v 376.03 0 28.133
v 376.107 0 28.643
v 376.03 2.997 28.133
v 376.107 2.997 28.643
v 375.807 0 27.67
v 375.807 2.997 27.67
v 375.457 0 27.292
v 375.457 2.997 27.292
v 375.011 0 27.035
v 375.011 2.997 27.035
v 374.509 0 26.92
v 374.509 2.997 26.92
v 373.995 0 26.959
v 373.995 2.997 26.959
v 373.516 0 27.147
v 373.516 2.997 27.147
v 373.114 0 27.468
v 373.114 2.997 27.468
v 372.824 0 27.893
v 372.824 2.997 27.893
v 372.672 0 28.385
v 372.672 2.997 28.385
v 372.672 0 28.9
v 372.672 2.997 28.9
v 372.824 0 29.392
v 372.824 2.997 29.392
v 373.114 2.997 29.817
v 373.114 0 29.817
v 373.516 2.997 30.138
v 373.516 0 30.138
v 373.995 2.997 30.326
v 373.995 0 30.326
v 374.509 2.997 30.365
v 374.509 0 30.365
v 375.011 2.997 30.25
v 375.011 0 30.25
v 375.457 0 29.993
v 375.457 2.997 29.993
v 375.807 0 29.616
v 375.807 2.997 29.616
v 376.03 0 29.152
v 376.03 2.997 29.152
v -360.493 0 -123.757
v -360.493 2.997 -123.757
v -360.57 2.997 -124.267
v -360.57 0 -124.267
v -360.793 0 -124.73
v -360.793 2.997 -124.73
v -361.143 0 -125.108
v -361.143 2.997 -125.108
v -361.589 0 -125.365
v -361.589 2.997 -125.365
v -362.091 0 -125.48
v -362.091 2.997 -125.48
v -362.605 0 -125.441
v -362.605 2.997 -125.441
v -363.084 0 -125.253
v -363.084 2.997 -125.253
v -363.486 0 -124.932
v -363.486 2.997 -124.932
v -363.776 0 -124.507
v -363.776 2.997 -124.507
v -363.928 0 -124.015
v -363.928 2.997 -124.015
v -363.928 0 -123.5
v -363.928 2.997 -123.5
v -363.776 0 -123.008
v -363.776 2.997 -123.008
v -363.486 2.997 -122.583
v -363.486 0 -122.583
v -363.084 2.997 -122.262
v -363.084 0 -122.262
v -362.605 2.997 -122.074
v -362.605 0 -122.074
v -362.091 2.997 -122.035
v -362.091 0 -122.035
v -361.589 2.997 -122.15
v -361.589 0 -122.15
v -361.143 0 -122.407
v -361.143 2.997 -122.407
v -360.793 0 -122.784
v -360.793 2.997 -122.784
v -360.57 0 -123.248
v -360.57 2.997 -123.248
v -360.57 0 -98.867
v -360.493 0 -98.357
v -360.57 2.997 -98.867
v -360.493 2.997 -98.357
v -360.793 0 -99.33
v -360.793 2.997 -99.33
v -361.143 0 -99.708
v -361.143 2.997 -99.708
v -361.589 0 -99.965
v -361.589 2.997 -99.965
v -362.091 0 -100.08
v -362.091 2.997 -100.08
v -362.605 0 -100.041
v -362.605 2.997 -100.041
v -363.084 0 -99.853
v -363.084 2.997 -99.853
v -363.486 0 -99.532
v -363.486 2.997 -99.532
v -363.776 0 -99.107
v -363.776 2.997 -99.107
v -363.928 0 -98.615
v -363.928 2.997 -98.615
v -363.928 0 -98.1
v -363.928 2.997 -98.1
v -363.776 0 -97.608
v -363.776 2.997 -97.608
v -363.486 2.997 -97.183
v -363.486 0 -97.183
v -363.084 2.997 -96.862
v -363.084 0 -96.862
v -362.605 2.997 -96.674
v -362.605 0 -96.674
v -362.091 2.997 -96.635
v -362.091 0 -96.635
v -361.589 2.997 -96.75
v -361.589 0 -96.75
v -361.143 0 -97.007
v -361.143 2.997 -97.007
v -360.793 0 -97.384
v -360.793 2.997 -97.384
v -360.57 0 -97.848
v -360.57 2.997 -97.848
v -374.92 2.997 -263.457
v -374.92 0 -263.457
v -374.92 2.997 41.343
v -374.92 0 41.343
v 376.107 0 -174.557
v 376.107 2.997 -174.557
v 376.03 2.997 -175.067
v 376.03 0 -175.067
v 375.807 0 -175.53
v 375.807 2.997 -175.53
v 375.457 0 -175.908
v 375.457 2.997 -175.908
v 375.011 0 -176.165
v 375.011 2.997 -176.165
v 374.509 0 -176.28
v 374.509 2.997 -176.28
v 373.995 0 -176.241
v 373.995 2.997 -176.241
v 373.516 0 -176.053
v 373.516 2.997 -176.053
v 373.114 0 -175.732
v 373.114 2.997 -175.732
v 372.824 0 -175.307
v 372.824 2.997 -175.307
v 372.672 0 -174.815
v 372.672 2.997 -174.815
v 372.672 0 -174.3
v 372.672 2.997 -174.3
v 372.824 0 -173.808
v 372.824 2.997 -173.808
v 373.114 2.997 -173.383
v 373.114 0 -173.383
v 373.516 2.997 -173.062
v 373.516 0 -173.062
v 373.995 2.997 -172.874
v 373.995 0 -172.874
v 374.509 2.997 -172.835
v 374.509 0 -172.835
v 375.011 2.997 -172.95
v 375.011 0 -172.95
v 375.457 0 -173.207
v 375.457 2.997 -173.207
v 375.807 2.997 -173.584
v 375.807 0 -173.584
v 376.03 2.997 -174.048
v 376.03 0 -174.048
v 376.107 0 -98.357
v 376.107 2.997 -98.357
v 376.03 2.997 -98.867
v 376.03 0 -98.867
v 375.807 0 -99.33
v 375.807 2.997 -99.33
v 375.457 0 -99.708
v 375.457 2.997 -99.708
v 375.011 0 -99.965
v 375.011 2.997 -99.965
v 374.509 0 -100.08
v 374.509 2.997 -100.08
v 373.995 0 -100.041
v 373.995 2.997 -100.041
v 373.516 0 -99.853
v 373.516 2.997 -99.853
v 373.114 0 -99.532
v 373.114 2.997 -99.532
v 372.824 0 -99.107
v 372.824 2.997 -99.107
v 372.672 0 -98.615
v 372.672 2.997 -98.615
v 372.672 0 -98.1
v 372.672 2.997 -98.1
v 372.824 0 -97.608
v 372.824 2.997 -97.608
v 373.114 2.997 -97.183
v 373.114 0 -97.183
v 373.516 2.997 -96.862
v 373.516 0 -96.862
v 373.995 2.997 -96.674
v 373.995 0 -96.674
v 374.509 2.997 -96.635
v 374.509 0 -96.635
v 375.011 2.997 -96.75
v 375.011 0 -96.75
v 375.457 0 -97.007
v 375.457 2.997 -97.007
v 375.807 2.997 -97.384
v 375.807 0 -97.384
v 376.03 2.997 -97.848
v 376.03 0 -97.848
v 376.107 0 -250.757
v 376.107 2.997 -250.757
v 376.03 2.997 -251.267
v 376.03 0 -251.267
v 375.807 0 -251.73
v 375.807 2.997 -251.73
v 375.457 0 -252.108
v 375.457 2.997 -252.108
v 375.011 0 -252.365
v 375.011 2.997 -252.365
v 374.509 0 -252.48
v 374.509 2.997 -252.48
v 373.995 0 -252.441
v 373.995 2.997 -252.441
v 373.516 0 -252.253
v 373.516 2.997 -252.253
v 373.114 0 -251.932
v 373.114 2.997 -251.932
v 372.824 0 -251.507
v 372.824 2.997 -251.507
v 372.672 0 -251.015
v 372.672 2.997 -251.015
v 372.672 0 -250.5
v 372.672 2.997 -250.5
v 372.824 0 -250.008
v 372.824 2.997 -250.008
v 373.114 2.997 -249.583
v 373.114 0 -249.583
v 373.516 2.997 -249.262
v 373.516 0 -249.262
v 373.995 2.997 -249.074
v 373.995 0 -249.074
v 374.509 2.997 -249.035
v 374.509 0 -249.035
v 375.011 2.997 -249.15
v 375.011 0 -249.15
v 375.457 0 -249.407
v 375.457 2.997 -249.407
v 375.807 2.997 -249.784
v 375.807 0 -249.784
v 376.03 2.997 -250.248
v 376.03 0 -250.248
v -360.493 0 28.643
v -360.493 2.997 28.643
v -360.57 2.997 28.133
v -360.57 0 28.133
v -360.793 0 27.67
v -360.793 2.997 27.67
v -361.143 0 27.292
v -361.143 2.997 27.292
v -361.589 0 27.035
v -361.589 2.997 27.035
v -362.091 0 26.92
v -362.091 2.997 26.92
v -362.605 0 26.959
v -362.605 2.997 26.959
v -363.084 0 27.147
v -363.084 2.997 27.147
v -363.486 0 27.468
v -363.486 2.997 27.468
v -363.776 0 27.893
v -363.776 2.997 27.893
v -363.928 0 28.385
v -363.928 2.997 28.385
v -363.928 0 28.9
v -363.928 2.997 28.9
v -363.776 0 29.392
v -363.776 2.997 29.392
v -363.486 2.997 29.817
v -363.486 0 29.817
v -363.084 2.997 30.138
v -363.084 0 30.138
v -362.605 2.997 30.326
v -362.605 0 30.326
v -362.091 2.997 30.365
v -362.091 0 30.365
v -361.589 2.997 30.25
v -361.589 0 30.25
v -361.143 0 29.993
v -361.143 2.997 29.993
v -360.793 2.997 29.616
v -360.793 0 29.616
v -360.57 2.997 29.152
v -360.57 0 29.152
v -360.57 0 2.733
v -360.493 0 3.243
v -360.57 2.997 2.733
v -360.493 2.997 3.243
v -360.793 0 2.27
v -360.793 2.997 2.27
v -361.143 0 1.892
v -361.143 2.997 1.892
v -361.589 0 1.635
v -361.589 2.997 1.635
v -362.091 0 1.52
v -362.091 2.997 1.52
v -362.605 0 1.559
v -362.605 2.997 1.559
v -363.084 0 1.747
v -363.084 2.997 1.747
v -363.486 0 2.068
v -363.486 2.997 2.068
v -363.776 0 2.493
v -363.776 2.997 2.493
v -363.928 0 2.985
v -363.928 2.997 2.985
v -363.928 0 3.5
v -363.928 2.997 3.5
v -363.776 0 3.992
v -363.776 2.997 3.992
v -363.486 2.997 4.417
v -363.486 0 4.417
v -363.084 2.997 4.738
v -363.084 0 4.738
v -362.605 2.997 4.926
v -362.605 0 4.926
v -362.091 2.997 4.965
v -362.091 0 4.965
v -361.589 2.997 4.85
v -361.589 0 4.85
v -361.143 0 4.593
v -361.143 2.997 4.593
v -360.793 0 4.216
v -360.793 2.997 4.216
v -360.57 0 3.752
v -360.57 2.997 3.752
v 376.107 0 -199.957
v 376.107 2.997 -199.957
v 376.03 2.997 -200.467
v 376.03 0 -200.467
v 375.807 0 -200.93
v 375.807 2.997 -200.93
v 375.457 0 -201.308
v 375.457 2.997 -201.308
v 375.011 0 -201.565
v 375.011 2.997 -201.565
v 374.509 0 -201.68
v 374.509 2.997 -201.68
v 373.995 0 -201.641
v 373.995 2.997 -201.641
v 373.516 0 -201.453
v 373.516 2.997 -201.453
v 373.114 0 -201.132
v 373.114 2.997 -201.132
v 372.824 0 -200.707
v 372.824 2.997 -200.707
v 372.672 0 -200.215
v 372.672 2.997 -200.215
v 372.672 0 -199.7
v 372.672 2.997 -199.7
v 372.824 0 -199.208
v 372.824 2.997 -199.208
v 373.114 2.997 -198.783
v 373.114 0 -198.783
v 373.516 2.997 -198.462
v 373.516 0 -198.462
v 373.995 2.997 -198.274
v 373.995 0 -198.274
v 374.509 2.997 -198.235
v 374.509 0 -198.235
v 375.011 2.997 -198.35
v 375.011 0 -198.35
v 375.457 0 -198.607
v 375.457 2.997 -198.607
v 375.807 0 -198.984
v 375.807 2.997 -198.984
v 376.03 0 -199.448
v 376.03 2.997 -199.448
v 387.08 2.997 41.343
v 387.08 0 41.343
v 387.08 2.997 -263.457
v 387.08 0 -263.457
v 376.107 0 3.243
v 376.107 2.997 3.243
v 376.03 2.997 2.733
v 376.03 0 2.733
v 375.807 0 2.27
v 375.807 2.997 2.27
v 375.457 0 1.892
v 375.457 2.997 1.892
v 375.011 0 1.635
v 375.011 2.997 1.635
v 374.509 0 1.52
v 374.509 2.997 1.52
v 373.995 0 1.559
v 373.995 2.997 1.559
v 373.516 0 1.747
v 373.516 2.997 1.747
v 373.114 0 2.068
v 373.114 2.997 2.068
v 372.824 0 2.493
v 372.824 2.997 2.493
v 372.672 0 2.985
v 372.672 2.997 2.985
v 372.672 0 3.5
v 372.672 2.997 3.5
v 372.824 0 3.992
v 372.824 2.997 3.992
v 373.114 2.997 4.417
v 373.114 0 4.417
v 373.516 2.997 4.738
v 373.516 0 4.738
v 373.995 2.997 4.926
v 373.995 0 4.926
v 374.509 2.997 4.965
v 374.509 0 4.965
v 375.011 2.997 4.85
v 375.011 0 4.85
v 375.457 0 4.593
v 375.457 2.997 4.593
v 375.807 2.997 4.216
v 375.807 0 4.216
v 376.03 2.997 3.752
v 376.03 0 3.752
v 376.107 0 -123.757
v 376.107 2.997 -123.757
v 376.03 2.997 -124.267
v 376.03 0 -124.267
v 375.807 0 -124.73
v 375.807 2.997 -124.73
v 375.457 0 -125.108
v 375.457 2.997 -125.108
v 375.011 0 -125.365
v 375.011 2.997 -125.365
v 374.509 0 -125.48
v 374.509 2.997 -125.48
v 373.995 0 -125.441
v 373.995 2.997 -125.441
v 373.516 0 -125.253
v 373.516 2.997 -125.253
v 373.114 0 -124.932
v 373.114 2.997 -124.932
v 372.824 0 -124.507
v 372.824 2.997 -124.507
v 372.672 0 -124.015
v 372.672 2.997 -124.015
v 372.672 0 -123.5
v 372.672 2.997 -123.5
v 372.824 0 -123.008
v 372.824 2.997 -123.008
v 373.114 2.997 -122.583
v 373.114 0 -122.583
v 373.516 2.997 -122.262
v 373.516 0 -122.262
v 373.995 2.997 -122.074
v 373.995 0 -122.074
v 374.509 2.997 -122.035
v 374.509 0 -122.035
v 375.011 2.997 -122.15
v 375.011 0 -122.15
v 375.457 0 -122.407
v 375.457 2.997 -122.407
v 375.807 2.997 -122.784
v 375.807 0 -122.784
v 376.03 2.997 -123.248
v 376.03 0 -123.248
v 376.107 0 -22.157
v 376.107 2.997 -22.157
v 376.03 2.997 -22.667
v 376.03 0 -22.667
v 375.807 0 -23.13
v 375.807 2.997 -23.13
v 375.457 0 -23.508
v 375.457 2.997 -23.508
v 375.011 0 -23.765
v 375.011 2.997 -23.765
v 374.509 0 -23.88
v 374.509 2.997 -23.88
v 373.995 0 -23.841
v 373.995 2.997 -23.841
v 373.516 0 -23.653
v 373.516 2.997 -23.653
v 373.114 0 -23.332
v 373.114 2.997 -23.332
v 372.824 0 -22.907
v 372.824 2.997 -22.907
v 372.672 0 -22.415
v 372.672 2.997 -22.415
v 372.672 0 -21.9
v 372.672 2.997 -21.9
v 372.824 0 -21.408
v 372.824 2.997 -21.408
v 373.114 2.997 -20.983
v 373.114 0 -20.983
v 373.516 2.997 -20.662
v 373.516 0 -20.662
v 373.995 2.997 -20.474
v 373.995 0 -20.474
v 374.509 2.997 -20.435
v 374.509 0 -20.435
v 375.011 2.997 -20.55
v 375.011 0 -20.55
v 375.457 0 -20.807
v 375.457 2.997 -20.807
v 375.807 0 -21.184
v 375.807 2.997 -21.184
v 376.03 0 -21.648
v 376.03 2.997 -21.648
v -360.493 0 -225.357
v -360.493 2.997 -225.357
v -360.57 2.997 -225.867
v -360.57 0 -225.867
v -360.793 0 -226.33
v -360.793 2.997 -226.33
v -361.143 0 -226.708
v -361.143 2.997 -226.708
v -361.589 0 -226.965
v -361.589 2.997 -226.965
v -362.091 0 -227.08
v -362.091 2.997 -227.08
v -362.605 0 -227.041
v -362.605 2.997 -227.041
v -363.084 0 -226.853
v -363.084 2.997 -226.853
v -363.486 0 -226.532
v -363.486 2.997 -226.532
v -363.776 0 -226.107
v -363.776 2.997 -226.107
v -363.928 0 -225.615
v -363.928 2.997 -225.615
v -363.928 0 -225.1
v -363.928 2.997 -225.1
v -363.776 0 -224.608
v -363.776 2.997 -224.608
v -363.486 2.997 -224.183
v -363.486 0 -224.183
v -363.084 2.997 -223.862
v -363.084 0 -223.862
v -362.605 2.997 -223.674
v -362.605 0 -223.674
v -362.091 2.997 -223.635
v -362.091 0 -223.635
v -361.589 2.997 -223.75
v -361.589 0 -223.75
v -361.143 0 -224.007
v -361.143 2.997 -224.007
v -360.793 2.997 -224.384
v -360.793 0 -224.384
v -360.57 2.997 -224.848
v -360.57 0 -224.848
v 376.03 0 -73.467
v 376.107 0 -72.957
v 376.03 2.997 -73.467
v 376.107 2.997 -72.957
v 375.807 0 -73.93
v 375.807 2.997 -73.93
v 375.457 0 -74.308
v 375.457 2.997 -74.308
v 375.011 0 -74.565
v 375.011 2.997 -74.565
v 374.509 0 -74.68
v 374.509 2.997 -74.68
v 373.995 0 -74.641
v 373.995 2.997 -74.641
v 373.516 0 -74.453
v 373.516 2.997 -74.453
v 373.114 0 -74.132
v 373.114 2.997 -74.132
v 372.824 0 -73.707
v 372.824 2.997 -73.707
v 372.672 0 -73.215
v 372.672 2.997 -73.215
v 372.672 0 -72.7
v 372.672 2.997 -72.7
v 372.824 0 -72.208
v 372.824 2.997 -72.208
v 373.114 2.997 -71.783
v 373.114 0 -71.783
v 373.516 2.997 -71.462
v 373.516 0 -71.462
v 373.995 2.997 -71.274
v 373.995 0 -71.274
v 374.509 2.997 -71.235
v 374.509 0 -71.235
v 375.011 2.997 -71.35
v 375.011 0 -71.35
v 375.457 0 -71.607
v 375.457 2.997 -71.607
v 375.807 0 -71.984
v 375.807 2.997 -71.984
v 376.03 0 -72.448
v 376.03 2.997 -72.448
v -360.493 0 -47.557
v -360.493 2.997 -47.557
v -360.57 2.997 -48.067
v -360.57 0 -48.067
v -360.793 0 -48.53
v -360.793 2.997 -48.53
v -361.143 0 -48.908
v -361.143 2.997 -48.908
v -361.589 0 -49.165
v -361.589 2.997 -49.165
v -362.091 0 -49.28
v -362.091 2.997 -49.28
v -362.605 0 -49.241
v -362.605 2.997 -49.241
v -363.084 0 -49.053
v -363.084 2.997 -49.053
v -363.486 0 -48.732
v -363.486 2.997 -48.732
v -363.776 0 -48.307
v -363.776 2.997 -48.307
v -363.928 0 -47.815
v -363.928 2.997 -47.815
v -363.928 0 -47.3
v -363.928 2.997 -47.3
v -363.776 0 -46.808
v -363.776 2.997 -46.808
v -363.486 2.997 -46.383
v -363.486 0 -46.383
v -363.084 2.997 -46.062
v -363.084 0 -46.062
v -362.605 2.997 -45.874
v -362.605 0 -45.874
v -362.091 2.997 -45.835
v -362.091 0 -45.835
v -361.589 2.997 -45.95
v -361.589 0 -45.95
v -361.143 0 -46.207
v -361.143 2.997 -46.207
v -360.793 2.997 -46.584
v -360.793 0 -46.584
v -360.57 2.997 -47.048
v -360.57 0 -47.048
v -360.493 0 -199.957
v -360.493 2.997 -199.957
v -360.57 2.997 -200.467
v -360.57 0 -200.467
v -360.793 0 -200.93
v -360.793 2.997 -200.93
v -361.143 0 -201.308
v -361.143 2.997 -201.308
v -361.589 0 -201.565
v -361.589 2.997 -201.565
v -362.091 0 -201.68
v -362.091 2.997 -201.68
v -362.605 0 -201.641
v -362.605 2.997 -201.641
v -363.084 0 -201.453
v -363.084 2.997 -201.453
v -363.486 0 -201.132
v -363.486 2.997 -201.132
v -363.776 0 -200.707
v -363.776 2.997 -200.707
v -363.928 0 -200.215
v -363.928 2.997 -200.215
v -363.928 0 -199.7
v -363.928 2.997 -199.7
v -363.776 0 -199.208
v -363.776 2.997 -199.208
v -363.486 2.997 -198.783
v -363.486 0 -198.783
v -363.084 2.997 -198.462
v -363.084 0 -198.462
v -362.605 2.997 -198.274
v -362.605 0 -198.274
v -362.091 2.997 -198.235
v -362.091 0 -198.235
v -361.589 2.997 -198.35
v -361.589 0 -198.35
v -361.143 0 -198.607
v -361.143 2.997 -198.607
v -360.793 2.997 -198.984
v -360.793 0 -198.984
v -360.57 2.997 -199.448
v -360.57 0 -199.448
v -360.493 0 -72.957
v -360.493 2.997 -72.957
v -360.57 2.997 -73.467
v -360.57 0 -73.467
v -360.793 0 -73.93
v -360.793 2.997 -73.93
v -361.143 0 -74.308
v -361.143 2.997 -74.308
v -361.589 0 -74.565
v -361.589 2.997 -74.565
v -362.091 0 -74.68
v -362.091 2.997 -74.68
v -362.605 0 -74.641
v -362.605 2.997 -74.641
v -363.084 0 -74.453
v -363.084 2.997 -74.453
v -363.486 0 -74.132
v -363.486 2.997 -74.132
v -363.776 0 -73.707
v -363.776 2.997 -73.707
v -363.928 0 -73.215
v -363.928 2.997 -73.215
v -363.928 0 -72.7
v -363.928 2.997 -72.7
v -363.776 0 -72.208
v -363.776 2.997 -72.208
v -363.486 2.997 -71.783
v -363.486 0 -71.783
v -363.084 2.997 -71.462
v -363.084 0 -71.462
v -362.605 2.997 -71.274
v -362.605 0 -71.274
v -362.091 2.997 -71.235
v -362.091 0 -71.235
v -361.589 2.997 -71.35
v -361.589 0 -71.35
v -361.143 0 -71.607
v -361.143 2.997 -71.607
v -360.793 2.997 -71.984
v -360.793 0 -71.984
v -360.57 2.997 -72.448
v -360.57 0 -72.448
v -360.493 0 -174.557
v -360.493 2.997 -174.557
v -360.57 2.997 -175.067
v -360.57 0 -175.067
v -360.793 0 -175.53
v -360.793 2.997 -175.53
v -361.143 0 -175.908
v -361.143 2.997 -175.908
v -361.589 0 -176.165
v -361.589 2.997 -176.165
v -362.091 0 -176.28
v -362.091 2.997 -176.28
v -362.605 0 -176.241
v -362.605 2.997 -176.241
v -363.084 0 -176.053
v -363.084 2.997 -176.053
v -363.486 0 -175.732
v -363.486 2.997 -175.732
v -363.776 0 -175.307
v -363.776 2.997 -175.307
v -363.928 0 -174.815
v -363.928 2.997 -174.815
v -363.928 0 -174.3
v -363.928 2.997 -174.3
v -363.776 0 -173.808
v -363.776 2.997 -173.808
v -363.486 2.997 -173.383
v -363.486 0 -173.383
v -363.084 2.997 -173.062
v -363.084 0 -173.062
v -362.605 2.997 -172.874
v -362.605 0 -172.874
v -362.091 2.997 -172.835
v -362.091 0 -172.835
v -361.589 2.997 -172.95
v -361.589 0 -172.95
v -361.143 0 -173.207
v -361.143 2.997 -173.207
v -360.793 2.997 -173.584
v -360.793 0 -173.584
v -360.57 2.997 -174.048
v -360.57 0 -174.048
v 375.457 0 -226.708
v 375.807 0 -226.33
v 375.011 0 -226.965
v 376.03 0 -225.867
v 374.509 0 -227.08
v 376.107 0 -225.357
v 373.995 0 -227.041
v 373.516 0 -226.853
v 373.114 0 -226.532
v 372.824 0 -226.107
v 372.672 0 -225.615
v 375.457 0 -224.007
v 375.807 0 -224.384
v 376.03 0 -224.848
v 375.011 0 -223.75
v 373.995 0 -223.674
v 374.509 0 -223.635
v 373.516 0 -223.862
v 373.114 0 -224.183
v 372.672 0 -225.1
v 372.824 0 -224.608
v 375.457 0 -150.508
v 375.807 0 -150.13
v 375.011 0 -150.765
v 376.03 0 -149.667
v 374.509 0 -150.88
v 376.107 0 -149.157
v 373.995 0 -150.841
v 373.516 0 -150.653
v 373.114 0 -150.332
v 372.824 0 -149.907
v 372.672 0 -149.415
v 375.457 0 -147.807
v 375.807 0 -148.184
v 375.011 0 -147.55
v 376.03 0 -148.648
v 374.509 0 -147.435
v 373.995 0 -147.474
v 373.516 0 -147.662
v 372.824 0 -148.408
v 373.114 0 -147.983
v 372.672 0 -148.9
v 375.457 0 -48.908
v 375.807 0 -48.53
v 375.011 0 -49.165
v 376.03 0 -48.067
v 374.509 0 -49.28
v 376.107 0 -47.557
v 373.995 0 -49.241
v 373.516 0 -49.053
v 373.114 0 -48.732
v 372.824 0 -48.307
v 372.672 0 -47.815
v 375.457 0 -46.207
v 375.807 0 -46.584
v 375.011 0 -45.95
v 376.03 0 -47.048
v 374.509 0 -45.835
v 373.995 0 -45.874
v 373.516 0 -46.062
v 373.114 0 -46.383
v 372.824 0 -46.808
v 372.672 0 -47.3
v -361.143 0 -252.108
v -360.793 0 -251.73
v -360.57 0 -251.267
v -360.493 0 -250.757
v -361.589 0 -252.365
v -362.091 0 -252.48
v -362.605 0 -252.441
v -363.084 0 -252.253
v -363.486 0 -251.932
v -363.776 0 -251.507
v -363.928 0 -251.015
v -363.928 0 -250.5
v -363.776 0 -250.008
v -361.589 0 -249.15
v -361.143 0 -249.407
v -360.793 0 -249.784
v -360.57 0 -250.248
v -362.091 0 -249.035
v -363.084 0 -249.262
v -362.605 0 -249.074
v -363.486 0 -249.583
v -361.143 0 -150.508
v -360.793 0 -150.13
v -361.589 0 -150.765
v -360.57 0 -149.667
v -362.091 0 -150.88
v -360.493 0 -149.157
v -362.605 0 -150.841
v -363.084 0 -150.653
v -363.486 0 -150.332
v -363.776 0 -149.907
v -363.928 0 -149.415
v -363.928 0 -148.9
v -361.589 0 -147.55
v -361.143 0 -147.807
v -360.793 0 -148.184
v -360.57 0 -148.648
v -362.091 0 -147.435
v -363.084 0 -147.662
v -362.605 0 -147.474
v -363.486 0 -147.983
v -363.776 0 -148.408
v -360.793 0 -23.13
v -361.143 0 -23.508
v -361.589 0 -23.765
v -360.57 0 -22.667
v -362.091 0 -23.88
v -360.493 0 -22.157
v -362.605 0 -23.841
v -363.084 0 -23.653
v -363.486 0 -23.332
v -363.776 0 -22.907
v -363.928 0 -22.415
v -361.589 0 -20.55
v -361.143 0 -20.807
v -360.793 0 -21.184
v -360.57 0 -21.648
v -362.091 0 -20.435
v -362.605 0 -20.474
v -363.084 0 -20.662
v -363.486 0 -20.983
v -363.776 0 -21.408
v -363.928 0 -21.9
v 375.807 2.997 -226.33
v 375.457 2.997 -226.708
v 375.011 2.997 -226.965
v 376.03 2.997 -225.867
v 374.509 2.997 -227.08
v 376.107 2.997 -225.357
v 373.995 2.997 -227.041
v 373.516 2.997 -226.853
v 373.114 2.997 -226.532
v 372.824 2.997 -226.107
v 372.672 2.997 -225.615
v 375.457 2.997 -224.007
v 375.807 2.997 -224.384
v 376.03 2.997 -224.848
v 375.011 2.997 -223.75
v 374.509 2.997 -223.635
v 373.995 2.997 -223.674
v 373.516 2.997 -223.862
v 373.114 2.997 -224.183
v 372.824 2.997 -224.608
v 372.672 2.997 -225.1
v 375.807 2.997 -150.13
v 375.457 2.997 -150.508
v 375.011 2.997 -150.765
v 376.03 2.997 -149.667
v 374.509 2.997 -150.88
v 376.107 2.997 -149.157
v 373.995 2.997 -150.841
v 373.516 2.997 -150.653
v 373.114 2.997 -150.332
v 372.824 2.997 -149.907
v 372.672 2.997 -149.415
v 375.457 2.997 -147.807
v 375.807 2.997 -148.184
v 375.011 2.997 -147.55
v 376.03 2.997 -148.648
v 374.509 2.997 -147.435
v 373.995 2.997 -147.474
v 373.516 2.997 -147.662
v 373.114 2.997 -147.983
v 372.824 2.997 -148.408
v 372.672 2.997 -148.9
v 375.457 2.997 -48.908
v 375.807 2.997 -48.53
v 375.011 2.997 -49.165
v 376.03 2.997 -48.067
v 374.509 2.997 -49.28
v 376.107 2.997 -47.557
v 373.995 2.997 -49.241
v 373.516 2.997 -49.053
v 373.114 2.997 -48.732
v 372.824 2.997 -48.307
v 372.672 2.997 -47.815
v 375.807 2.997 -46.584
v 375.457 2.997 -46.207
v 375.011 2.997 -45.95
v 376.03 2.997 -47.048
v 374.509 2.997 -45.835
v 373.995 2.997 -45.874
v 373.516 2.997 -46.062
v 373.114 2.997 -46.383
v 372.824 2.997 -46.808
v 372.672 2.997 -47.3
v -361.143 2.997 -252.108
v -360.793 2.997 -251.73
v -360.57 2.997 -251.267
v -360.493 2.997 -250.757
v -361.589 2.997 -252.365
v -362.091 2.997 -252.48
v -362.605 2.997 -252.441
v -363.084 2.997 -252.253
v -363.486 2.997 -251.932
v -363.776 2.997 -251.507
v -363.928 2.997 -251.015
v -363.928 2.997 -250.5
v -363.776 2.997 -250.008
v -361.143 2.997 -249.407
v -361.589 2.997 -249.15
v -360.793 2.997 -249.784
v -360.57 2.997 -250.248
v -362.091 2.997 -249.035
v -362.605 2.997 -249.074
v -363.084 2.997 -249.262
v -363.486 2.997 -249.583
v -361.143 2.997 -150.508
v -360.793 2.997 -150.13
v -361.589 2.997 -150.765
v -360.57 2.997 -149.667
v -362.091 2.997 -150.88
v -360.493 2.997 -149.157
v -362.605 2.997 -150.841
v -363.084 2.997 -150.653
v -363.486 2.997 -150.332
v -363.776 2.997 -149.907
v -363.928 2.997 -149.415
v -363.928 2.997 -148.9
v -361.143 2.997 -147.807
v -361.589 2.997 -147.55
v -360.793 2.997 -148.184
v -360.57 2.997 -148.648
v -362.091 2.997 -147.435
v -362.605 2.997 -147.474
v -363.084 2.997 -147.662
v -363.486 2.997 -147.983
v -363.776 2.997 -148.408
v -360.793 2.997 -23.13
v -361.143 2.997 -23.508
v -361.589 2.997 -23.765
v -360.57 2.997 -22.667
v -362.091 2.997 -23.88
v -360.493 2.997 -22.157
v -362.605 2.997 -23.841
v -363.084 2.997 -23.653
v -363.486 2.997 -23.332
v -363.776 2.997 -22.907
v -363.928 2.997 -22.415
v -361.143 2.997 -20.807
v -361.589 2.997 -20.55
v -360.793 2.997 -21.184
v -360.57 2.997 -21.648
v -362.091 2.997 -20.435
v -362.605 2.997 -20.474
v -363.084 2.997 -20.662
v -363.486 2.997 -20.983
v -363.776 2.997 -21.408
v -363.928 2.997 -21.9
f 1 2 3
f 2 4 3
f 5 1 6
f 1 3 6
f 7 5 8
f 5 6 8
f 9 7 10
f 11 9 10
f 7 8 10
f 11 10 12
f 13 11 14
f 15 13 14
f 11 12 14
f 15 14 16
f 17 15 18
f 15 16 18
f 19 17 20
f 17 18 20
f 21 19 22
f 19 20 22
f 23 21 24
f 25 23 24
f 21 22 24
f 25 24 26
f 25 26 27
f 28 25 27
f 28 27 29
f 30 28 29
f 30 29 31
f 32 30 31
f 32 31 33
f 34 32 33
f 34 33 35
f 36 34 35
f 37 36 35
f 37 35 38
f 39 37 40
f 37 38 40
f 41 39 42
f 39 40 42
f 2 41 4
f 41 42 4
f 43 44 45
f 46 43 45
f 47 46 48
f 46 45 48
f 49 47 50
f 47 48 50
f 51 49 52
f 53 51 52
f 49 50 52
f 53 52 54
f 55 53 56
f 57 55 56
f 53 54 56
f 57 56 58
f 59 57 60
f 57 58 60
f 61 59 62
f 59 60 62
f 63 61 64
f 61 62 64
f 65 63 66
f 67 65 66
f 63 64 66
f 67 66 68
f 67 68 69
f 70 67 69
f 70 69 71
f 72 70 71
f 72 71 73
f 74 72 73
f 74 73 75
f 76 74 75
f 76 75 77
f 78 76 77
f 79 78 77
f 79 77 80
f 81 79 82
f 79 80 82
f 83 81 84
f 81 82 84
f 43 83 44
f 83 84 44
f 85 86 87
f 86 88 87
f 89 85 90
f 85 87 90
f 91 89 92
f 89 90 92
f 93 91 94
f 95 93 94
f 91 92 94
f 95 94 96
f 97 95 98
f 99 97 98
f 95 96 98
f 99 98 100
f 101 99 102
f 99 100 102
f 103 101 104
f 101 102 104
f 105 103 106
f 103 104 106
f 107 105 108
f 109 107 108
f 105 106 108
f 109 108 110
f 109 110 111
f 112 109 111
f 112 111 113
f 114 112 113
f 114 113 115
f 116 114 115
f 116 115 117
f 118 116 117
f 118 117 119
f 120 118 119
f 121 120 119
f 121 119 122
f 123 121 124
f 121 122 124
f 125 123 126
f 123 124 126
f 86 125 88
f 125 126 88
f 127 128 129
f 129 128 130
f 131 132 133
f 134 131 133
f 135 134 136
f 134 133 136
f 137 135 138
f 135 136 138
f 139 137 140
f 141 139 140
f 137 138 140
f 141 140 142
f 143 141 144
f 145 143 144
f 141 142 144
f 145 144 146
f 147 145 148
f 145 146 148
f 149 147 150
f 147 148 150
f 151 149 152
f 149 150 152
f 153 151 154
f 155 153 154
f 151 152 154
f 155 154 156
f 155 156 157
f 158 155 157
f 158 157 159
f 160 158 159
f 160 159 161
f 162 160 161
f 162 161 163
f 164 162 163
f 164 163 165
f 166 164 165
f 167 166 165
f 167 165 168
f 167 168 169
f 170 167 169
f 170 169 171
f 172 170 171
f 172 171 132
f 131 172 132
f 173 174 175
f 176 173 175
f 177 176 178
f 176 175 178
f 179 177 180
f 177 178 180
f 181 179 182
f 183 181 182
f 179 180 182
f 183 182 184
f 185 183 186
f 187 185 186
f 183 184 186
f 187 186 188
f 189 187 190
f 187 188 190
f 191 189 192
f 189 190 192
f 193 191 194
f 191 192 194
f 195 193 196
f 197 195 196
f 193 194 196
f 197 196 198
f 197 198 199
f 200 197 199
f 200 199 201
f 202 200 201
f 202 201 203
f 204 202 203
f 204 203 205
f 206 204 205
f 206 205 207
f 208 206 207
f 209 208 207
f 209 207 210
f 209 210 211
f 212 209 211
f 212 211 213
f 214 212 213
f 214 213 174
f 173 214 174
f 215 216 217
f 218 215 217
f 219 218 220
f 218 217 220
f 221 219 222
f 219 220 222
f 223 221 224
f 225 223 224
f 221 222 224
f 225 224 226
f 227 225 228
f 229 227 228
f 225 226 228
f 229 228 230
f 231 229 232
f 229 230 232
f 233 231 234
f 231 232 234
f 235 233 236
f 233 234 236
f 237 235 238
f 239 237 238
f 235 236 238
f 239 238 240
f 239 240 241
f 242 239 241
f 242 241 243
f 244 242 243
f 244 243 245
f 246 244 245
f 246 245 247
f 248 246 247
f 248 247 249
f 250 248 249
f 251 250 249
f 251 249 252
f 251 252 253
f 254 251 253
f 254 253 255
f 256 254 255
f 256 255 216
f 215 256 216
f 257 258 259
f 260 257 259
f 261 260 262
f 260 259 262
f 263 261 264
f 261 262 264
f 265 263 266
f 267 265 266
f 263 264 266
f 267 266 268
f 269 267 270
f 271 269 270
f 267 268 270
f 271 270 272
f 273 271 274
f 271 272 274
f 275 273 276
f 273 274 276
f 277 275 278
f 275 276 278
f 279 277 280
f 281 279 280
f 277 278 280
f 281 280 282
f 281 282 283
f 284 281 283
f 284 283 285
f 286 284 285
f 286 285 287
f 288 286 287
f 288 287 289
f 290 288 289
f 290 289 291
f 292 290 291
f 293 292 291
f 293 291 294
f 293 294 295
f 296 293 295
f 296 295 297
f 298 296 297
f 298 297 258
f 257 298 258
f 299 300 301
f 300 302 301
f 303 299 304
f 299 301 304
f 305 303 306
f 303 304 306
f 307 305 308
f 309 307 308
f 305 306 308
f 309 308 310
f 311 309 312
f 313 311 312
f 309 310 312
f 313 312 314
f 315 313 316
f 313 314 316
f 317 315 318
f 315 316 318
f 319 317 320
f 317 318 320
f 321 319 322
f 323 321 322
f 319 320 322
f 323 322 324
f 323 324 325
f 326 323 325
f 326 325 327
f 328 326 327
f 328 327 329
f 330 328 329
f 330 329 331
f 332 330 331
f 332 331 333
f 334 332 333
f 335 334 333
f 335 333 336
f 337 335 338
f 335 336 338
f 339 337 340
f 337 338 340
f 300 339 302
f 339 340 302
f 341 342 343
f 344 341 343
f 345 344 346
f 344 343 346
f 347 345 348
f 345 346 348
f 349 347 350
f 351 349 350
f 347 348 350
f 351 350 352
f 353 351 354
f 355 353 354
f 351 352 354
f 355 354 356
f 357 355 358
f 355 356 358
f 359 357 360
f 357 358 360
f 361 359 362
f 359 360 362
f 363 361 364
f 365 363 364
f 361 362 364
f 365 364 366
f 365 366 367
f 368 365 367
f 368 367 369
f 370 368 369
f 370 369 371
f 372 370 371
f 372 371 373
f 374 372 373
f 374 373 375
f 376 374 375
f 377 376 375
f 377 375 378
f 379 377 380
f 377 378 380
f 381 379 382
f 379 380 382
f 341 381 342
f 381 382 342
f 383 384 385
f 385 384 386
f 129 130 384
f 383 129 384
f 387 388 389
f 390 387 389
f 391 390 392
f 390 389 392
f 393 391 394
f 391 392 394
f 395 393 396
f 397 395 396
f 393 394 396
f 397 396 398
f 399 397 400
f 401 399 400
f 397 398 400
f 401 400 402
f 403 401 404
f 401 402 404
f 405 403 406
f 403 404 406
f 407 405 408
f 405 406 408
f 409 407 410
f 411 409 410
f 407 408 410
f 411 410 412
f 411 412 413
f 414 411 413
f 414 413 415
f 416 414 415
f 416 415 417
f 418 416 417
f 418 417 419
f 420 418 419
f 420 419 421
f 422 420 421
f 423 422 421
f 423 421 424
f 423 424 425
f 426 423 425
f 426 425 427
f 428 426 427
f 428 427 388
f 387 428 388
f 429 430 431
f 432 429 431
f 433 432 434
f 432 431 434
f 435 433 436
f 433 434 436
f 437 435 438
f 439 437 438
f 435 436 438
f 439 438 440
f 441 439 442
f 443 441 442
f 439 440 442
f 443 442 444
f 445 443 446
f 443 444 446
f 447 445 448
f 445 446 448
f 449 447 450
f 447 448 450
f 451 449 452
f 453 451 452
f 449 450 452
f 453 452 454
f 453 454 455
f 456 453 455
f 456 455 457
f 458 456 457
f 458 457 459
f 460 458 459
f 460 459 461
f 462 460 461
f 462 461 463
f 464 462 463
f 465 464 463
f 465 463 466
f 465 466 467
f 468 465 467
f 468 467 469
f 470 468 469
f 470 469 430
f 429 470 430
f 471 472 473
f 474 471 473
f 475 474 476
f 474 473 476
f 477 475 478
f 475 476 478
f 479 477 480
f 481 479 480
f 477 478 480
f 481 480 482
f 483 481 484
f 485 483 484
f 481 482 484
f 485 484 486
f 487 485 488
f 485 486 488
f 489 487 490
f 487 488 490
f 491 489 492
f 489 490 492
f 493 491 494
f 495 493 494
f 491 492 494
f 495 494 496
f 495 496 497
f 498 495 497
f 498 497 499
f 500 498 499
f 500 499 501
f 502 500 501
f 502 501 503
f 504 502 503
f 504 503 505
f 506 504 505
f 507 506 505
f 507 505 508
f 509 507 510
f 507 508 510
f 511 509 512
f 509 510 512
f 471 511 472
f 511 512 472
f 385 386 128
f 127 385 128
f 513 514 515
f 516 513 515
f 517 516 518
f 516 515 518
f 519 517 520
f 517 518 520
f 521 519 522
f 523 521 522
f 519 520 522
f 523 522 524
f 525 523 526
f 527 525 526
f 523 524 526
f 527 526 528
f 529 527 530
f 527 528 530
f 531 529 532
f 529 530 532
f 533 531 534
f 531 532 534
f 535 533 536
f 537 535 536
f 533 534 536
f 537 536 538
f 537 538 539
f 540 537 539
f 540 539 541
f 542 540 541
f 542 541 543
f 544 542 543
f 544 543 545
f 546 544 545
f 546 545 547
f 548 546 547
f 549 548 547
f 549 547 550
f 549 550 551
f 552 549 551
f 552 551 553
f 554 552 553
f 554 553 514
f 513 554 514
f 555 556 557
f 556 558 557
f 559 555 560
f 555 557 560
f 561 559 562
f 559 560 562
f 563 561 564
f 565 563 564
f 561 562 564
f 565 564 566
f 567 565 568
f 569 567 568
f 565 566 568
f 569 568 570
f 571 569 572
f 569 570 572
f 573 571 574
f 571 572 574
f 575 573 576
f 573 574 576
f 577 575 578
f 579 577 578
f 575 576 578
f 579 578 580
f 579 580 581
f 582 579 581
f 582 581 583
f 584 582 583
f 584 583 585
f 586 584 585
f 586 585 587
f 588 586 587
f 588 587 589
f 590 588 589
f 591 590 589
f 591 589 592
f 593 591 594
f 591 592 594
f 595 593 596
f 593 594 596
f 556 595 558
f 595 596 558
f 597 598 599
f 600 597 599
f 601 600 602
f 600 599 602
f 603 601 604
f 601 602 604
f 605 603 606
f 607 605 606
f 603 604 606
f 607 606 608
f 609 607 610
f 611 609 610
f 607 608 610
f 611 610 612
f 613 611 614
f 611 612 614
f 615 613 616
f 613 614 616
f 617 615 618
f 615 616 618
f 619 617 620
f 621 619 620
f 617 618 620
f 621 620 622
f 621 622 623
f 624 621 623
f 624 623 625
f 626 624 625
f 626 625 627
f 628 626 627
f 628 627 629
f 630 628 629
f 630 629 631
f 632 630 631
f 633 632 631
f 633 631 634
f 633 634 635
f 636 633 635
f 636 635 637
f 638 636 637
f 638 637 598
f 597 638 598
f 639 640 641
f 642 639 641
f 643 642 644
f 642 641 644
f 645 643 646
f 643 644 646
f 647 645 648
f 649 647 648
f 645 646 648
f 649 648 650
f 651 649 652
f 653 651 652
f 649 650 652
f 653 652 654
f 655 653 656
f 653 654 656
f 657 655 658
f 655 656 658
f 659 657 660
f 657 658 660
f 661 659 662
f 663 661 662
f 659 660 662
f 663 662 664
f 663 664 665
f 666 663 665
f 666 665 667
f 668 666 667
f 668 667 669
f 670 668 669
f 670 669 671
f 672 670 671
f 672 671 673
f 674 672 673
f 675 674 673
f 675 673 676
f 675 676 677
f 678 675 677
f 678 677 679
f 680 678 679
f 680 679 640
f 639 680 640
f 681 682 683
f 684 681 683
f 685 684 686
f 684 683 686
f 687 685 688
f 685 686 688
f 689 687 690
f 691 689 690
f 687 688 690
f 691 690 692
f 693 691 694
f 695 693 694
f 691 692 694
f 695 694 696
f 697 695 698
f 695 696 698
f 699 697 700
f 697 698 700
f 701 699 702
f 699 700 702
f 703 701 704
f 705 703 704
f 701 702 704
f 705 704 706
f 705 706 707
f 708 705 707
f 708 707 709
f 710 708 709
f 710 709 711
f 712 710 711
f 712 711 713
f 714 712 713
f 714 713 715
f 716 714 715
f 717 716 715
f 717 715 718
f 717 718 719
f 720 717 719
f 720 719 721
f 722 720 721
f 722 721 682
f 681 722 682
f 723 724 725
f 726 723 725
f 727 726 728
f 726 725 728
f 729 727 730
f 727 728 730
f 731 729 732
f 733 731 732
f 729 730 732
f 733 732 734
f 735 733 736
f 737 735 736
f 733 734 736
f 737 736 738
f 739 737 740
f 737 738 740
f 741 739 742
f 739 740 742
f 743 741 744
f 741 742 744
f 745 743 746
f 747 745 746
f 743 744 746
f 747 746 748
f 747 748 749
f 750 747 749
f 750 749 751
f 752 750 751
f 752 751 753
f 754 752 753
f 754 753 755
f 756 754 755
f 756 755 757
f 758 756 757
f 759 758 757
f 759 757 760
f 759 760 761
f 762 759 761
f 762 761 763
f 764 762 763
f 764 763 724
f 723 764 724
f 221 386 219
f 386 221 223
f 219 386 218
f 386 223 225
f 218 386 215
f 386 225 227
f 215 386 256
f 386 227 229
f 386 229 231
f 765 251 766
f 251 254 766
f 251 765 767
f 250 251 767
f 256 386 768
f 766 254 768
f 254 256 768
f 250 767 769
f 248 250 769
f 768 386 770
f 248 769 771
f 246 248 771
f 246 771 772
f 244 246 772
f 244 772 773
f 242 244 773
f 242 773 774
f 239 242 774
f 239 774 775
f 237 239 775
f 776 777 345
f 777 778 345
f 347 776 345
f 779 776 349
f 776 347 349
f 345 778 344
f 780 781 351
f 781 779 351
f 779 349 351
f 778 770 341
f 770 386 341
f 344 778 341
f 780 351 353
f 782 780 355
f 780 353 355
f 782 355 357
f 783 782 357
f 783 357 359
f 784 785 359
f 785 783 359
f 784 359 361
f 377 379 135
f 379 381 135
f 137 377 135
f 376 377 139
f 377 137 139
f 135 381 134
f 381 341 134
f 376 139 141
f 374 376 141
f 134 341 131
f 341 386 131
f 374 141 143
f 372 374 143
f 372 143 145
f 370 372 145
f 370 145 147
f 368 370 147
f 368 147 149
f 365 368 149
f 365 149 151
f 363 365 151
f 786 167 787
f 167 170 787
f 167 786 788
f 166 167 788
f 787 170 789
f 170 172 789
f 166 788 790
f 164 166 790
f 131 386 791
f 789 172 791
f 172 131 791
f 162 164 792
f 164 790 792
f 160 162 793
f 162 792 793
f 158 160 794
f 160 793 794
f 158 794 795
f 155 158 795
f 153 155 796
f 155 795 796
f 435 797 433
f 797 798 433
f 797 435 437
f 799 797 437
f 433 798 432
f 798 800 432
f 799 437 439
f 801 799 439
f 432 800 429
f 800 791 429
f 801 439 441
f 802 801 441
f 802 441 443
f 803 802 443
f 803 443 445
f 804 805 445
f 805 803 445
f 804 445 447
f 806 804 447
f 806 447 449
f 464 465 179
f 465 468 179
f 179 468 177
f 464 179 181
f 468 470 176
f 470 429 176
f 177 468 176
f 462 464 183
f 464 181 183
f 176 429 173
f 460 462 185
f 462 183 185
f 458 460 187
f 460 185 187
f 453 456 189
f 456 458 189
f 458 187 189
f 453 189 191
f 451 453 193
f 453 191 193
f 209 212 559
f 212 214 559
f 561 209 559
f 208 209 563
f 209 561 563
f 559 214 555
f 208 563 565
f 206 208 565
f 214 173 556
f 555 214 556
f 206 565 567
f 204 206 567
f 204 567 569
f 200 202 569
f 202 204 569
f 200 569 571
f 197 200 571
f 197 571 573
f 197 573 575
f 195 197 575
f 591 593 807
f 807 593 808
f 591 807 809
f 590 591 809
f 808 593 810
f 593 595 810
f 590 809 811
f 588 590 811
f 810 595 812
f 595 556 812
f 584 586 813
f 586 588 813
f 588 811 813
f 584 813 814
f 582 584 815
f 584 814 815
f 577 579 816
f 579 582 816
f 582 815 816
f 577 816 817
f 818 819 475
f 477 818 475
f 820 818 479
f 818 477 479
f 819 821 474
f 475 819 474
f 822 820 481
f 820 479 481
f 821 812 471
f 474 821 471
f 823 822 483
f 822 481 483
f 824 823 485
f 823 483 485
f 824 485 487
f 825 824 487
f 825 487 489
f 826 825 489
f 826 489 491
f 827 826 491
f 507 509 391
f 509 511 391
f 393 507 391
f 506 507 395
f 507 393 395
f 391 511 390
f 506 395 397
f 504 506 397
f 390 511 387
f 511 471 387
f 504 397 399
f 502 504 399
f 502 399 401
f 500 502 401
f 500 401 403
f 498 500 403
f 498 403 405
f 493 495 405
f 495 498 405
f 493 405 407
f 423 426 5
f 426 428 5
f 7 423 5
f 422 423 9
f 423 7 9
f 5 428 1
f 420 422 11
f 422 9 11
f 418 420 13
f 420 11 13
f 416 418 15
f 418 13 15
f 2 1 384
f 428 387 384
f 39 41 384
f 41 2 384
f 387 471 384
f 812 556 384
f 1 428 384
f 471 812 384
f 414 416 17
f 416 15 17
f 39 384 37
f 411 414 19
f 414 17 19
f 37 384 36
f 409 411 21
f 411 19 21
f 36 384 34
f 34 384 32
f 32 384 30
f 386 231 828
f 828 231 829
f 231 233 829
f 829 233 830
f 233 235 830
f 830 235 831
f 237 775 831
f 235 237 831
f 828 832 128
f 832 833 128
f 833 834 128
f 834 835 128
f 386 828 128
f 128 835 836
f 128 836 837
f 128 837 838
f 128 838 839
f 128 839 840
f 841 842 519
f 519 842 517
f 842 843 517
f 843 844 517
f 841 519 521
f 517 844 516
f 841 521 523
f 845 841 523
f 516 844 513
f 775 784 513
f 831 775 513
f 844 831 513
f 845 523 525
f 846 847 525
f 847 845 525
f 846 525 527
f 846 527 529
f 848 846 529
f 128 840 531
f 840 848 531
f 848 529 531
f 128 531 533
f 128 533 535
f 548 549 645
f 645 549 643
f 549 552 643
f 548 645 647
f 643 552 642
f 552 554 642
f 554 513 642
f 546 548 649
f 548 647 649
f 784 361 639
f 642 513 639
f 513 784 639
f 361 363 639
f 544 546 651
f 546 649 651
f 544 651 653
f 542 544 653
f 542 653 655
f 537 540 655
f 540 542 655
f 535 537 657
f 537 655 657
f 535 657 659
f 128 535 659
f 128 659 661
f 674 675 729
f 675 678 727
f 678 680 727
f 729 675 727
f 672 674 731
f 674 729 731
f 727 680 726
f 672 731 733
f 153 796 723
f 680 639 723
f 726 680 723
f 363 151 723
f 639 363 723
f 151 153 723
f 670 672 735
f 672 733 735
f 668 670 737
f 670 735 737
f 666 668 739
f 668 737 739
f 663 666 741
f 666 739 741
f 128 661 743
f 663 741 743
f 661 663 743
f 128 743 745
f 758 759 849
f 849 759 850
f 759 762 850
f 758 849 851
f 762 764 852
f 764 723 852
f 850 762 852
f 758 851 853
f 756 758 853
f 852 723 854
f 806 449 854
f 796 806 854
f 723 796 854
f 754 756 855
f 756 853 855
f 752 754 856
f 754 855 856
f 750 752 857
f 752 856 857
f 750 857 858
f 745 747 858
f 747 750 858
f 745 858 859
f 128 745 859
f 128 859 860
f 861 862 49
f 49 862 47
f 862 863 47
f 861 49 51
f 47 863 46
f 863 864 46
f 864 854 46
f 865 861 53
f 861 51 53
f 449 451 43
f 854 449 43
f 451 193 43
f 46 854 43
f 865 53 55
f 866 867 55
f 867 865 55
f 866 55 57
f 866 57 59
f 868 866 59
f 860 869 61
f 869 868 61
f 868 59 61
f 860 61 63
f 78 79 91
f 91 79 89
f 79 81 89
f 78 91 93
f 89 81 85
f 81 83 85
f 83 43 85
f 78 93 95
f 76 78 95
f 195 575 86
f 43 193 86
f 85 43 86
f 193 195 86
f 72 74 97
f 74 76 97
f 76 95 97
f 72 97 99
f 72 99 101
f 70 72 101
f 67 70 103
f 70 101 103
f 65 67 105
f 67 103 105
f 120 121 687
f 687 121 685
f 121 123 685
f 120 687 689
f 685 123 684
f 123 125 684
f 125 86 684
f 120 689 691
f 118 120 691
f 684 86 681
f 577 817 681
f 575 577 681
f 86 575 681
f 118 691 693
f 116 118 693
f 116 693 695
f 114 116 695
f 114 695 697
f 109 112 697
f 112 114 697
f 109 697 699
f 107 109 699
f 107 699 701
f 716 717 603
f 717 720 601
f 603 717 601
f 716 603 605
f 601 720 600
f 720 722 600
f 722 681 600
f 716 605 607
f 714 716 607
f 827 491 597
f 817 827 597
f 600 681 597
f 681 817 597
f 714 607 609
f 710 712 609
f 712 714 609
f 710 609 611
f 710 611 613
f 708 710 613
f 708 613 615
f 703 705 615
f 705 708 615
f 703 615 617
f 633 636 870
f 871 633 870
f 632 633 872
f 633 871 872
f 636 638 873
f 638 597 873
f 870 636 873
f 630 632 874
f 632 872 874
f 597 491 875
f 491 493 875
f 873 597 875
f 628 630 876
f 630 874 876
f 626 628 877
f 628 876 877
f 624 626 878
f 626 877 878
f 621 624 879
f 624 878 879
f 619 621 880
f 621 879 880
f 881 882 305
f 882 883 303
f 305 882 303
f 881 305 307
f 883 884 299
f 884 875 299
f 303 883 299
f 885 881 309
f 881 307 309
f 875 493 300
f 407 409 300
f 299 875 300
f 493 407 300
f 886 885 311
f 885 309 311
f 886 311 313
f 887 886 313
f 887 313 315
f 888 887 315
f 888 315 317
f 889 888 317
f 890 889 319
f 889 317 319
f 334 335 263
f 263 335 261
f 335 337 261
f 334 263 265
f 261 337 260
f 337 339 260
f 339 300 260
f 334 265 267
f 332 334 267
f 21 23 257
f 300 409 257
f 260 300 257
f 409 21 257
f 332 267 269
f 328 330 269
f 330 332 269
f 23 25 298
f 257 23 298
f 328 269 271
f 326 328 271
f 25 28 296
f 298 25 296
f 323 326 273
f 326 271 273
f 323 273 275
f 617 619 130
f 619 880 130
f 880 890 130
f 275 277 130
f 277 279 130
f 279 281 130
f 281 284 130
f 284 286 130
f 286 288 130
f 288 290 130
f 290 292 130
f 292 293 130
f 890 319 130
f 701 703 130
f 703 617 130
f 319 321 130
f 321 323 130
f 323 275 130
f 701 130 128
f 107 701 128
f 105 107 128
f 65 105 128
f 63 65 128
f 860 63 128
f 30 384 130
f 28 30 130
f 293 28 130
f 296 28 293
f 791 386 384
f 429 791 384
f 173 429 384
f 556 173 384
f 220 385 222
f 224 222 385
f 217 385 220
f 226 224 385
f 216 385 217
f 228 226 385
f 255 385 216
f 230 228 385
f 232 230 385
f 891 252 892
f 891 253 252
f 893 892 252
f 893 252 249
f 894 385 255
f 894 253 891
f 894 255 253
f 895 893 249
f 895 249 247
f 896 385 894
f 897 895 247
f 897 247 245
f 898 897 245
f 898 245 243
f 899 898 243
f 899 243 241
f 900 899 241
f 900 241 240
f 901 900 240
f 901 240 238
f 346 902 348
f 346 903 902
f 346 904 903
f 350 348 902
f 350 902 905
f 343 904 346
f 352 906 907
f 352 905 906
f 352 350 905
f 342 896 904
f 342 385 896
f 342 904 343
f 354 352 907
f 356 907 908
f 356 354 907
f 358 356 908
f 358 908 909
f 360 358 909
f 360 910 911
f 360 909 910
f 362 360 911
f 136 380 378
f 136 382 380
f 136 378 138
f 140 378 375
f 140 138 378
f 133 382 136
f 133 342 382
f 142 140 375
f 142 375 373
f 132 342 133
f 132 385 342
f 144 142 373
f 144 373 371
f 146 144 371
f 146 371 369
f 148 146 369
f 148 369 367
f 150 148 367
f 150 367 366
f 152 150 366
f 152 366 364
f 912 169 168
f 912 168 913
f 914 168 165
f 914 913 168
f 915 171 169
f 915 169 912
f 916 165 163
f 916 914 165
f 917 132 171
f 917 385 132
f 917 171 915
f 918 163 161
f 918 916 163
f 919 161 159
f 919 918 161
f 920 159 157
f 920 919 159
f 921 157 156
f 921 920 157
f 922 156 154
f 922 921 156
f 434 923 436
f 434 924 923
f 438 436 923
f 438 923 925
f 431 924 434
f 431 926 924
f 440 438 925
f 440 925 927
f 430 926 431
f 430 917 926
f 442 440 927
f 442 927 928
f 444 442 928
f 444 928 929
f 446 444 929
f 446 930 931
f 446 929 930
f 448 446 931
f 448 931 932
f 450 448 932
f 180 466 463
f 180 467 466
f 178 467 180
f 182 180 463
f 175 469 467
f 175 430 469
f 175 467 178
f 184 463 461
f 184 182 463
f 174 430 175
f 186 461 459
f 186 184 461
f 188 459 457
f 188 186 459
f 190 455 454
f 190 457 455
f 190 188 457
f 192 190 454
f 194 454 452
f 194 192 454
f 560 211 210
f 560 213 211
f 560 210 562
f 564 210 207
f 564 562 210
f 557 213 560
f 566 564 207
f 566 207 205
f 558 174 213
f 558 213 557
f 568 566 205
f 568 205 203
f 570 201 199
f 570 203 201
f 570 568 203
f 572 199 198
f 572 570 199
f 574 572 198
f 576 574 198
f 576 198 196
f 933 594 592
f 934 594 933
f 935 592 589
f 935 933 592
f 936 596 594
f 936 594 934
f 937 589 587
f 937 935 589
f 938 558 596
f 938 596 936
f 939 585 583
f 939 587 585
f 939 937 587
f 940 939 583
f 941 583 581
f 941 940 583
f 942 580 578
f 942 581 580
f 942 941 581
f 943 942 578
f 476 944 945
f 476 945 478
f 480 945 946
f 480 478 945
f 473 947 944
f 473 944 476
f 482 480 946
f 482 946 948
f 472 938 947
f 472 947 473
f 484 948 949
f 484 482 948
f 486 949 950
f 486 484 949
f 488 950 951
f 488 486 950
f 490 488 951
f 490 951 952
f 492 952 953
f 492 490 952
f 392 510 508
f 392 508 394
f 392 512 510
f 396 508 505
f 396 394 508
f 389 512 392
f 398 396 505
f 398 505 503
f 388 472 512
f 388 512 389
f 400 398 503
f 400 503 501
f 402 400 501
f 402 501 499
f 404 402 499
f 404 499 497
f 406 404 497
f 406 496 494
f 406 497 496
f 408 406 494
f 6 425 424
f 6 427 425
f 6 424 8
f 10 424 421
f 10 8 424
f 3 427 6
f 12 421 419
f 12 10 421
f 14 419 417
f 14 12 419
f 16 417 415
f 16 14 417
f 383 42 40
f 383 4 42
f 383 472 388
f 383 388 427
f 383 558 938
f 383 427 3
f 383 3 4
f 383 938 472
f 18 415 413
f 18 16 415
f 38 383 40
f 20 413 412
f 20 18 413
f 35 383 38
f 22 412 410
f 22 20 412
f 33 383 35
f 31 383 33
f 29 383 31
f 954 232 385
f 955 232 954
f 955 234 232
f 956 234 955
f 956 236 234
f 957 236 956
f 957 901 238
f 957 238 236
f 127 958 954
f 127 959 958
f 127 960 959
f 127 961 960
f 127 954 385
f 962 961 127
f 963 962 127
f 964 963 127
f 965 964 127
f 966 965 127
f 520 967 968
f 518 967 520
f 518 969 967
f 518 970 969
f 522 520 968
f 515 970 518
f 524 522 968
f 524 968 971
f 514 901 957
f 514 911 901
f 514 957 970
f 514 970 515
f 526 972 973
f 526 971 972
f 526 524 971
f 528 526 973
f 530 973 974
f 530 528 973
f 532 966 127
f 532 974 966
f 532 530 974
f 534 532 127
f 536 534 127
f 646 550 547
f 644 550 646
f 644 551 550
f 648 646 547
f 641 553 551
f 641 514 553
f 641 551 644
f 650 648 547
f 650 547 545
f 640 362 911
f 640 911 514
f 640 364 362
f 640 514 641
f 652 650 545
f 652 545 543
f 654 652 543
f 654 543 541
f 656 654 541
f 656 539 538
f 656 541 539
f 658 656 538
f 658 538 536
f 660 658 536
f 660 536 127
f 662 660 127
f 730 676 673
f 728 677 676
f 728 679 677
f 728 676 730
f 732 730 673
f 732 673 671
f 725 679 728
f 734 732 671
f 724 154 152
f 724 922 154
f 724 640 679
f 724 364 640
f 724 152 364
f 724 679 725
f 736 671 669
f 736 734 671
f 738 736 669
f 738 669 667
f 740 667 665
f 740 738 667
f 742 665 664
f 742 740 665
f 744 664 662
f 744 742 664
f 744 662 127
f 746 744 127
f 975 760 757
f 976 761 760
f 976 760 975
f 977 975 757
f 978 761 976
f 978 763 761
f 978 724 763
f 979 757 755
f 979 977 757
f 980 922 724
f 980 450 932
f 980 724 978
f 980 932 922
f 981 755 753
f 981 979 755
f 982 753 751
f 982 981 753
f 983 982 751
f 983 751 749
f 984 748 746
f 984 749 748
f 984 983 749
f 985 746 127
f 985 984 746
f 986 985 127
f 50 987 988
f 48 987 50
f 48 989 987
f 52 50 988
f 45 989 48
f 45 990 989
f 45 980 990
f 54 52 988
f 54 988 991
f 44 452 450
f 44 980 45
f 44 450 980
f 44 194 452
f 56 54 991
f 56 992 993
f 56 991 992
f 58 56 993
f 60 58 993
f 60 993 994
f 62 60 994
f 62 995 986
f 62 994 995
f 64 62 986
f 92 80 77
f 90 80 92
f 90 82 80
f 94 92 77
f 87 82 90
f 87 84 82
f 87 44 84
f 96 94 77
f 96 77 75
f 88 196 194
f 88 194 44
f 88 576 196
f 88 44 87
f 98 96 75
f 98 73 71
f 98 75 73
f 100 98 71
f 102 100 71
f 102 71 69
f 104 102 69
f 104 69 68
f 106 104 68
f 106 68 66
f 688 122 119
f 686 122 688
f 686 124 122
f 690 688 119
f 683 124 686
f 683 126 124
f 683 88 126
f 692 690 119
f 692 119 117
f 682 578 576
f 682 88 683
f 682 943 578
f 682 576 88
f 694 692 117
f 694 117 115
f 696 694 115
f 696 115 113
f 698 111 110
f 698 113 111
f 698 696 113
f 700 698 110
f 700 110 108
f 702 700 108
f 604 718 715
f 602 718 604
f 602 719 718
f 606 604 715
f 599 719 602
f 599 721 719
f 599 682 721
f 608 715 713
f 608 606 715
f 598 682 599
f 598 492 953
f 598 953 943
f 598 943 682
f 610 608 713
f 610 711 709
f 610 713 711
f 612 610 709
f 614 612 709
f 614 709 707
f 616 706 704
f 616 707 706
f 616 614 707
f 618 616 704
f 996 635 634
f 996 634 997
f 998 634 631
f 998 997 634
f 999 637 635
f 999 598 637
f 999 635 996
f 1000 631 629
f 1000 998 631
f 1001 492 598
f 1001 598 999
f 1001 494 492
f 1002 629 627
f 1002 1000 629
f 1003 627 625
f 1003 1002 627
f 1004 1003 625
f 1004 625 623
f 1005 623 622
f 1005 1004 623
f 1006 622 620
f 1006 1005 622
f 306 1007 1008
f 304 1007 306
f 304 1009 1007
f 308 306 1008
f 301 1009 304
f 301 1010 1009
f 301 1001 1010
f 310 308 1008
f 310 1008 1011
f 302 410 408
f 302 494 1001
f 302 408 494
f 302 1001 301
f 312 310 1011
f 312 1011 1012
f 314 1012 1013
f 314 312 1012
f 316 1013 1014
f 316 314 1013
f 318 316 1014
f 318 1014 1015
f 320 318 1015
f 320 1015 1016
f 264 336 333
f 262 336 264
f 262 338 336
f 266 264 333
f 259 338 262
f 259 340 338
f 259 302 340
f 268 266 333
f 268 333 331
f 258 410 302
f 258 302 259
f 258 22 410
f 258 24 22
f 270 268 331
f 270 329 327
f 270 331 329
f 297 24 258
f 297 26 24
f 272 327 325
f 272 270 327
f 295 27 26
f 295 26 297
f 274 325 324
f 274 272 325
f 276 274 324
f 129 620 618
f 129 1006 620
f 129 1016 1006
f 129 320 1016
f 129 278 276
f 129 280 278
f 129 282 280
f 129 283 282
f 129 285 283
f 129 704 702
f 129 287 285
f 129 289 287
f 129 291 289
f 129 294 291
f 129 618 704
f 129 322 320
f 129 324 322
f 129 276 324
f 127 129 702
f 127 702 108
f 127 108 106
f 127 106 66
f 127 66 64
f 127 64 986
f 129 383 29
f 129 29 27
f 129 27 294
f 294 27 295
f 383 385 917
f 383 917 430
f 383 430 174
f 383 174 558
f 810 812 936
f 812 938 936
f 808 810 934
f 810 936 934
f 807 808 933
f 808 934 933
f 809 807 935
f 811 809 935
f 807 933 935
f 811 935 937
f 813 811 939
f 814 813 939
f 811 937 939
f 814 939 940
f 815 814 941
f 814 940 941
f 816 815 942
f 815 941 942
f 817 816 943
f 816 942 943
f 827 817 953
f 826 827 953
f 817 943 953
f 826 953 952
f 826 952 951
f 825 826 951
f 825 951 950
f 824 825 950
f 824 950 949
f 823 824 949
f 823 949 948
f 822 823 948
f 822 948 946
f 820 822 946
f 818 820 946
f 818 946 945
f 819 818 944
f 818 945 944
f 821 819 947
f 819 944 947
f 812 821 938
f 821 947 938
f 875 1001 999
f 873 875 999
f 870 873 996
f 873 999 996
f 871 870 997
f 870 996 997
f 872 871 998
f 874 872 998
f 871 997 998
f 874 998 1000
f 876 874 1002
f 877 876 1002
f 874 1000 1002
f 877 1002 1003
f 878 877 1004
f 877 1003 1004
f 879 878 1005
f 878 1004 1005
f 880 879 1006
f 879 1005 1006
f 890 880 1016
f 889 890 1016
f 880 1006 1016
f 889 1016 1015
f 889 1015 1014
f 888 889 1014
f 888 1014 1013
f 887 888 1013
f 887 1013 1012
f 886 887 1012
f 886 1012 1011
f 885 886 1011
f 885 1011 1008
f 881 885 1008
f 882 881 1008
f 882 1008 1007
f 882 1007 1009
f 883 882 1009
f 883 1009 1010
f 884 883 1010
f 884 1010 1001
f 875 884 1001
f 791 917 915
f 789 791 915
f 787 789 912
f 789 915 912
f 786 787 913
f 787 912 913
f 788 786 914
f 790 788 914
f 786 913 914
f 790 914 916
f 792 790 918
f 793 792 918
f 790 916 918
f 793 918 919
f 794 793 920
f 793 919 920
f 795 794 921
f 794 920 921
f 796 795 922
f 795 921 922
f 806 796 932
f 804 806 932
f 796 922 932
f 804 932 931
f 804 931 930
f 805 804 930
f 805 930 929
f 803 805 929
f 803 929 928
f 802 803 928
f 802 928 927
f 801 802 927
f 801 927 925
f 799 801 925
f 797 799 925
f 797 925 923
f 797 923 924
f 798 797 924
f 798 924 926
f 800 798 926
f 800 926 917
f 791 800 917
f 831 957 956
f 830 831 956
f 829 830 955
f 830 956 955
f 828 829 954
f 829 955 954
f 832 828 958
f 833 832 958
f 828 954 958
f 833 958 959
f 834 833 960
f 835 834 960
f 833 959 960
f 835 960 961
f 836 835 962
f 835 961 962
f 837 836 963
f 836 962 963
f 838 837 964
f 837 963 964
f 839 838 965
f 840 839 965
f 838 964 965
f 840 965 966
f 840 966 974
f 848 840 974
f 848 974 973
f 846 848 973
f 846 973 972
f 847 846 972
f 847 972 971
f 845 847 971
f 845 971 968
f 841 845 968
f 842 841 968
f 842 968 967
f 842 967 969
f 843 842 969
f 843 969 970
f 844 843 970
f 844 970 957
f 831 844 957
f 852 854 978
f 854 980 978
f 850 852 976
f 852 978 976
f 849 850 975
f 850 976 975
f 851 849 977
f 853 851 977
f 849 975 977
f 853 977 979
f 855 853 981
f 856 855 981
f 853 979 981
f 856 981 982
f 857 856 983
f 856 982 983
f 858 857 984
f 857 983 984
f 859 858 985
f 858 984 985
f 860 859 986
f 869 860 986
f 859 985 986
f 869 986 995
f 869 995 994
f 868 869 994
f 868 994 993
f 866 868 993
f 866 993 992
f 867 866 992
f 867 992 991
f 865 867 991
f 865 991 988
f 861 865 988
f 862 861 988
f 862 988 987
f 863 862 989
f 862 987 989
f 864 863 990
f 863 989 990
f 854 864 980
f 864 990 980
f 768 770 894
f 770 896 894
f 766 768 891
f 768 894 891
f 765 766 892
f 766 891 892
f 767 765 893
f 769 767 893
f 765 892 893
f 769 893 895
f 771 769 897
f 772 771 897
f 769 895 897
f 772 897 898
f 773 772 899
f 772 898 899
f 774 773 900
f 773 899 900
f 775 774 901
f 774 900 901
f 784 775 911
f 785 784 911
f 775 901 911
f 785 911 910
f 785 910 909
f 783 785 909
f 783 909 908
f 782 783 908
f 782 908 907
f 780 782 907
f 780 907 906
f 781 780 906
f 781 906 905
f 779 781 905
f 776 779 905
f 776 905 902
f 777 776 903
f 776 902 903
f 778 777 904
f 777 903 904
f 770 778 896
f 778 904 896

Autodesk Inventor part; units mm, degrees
ref_plane "YZ Plane" through (0, 0, 0) normal (1, 0, 0) x (0, 1, 0)
ref_plane "XZ Plane" through (0, 0, 0) normal (0, 1, 0) x (-1, 0, 0)
ref_plane "XY Plane" through (0, 0, 0) normal (0, 0, 1) x (1, 0, 0)
sketch "Sketch1" plane through (0, 0, 0) normal (0, 1, 0) x (-1, 0, 0)
  line L0 (374.9202, 41.3426) -> (-387.0798, 41.3426)
  line L1 (-387.0798, 41.3426) -> (-387.0798, -263.4574)
  line L2 (-387.0798, -263.4574) -> (374.9202, -263.4574)
  line L3 (374.9202, -263.4574) -> (374.9202, 41.3426)
  point P0 (0, 0)
  dimension "d0" = 304.8
  dimension "d1" = 762
extrude "Extrusion1" add sketch "Sketch1" along normal blind 2.9972
sketch "Sketch2" plane through (0, 2.9972, 0) normal (0, 1, 0) x (1, 0, 0)
  circle A0 centre (-362.2202, -28.6426) radius 1.7272
  line L0 (-374.9202, 263.4574) -> (-374.9202, -41.3426) projected
  line L1 (-374.9202, -41.3426) -> (387.0798, -41.3426) projected
  point P0 (0, 0)
  dimension "d4" = 3.4544
  dimension "d5" = 12.7
  dimension "d6" = 12.7
extrude "Extrusion2" cut sketch "Sketch2" against normal through all
pattern_linear "Rectangular Pattern1" count 12 spacing 25.4 along (0, 0, -1) count 2 spacing 736.6 along (1, 0, 0) of "Extrusion2"
properties part number "12x30 Lexan" material "Polycarbonate, Clear"
